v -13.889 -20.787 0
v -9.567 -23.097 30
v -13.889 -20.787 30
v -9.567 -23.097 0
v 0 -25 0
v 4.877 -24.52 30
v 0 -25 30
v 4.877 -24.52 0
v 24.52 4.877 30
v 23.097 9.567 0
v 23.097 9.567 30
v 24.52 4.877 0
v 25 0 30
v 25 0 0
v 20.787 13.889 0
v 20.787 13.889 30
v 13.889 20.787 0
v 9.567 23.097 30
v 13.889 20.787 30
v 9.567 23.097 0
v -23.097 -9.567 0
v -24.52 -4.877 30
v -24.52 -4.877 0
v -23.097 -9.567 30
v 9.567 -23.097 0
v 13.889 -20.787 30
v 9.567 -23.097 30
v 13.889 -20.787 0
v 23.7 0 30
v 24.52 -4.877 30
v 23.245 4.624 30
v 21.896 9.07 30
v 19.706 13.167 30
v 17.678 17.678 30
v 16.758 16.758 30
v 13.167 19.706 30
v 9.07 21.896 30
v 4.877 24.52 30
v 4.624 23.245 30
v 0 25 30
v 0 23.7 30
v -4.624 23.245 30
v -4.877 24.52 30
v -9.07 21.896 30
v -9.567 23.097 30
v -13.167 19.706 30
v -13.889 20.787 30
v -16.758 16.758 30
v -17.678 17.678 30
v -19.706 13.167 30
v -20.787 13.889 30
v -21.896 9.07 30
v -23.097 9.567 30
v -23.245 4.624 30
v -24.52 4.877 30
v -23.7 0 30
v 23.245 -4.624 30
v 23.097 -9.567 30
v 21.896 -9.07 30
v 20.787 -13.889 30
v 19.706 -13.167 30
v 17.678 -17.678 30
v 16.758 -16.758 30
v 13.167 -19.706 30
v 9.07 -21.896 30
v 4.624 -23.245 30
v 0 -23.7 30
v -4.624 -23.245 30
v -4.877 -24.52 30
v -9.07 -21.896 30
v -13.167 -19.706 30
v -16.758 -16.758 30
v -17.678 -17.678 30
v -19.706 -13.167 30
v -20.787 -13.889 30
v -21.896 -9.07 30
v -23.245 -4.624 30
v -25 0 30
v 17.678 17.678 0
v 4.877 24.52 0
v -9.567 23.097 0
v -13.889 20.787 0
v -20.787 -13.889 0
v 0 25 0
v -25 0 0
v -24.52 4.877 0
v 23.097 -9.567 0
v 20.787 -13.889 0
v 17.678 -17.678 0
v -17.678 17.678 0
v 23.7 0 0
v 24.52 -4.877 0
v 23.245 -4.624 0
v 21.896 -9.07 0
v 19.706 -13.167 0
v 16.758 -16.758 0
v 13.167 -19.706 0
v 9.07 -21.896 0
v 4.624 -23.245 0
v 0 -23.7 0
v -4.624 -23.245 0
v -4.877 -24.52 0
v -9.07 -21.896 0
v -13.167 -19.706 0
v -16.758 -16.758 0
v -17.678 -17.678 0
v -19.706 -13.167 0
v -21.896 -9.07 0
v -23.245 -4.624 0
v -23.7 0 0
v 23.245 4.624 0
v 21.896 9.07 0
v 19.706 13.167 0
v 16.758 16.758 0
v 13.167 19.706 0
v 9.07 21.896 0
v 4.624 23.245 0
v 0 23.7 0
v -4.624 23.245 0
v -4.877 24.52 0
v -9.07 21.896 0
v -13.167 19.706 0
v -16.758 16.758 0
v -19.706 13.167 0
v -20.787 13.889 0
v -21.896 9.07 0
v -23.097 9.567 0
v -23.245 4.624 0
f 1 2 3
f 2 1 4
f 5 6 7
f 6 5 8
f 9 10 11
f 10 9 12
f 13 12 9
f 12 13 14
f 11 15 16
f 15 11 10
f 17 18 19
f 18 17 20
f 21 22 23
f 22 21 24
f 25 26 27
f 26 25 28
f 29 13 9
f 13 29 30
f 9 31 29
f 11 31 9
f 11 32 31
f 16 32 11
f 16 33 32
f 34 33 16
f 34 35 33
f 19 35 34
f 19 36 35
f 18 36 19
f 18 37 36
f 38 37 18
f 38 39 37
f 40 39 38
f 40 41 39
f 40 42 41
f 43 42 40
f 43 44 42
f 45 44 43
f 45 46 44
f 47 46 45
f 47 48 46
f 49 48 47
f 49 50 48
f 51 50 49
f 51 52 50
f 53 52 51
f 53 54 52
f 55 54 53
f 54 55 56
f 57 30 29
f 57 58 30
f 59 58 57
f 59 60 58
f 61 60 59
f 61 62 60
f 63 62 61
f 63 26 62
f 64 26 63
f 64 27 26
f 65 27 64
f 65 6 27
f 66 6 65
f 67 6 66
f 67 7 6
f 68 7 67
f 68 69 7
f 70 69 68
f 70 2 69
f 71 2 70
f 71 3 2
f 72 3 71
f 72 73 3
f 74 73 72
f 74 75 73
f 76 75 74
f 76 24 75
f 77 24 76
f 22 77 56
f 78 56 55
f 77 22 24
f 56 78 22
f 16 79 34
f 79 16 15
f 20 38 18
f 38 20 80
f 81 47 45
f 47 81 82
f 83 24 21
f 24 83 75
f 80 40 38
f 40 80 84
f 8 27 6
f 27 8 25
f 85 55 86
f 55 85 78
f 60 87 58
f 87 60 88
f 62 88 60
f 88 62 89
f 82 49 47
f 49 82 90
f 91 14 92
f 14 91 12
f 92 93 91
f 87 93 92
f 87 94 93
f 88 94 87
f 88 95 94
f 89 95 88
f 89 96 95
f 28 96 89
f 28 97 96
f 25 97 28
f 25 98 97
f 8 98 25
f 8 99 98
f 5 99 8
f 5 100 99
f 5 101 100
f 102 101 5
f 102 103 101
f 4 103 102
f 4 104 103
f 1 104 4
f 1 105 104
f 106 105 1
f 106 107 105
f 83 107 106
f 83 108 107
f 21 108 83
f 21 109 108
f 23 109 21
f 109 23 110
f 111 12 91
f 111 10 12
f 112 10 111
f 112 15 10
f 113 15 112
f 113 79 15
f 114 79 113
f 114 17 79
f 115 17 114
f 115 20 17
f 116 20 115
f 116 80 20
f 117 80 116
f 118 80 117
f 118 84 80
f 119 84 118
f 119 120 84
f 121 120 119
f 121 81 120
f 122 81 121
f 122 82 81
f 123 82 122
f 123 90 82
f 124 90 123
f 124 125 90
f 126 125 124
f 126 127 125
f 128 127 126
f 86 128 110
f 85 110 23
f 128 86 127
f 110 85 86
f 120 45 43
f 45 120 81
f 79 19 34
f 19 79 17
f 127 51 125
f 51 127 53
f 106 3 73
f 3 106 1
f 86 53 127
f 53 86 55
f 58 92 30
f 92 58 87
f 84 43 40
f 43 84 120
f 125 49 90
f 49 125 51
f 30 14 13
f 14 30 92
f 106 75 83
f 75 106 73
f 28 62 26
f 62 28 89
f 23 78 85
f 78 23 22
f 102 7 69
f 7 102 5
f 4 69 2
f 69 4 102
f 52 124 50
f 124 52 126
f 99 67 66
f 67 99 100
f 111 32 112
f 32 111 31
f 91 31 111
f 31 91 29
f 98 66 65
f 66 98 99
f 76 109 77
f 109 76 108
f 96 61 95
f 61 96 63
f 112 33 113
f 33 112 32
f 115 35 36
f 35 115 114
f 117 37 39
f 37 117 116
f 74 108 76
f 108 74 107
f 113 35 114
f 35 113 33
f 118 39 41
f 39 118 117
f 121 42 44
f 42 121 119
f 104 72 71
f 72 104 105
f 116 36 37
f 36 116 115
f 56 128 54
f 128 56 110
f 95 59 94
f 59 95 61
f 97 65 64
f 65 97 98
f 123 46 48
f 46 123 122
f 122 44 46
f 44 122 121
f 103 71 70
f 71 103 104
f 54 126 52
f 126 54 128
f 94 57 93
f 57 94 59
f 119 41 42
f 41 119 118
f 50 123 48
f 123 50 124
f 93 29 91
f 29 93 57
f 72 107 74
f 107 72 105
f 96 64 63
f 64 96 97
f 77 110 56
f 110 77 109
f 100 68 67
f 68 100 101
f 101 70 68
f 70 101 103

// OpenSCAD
$fn = 32;

// ----------------------------------------------------------------------
// Thin tube: 1.3 mm wall
// ----------------------------------------------------------------------

// --- parameters (mm) ---
tube_od = 50;             // outer diameter
tube_h = 30;              // height, Z
wall = 1.3;               // wall thickness

difference() {
  cylinder(h = tube_h, d = tube_od);
  translate([0, 0, -1]) cylinder(h = tube_h + 2, d = tube_od - 2 * wall);
}
